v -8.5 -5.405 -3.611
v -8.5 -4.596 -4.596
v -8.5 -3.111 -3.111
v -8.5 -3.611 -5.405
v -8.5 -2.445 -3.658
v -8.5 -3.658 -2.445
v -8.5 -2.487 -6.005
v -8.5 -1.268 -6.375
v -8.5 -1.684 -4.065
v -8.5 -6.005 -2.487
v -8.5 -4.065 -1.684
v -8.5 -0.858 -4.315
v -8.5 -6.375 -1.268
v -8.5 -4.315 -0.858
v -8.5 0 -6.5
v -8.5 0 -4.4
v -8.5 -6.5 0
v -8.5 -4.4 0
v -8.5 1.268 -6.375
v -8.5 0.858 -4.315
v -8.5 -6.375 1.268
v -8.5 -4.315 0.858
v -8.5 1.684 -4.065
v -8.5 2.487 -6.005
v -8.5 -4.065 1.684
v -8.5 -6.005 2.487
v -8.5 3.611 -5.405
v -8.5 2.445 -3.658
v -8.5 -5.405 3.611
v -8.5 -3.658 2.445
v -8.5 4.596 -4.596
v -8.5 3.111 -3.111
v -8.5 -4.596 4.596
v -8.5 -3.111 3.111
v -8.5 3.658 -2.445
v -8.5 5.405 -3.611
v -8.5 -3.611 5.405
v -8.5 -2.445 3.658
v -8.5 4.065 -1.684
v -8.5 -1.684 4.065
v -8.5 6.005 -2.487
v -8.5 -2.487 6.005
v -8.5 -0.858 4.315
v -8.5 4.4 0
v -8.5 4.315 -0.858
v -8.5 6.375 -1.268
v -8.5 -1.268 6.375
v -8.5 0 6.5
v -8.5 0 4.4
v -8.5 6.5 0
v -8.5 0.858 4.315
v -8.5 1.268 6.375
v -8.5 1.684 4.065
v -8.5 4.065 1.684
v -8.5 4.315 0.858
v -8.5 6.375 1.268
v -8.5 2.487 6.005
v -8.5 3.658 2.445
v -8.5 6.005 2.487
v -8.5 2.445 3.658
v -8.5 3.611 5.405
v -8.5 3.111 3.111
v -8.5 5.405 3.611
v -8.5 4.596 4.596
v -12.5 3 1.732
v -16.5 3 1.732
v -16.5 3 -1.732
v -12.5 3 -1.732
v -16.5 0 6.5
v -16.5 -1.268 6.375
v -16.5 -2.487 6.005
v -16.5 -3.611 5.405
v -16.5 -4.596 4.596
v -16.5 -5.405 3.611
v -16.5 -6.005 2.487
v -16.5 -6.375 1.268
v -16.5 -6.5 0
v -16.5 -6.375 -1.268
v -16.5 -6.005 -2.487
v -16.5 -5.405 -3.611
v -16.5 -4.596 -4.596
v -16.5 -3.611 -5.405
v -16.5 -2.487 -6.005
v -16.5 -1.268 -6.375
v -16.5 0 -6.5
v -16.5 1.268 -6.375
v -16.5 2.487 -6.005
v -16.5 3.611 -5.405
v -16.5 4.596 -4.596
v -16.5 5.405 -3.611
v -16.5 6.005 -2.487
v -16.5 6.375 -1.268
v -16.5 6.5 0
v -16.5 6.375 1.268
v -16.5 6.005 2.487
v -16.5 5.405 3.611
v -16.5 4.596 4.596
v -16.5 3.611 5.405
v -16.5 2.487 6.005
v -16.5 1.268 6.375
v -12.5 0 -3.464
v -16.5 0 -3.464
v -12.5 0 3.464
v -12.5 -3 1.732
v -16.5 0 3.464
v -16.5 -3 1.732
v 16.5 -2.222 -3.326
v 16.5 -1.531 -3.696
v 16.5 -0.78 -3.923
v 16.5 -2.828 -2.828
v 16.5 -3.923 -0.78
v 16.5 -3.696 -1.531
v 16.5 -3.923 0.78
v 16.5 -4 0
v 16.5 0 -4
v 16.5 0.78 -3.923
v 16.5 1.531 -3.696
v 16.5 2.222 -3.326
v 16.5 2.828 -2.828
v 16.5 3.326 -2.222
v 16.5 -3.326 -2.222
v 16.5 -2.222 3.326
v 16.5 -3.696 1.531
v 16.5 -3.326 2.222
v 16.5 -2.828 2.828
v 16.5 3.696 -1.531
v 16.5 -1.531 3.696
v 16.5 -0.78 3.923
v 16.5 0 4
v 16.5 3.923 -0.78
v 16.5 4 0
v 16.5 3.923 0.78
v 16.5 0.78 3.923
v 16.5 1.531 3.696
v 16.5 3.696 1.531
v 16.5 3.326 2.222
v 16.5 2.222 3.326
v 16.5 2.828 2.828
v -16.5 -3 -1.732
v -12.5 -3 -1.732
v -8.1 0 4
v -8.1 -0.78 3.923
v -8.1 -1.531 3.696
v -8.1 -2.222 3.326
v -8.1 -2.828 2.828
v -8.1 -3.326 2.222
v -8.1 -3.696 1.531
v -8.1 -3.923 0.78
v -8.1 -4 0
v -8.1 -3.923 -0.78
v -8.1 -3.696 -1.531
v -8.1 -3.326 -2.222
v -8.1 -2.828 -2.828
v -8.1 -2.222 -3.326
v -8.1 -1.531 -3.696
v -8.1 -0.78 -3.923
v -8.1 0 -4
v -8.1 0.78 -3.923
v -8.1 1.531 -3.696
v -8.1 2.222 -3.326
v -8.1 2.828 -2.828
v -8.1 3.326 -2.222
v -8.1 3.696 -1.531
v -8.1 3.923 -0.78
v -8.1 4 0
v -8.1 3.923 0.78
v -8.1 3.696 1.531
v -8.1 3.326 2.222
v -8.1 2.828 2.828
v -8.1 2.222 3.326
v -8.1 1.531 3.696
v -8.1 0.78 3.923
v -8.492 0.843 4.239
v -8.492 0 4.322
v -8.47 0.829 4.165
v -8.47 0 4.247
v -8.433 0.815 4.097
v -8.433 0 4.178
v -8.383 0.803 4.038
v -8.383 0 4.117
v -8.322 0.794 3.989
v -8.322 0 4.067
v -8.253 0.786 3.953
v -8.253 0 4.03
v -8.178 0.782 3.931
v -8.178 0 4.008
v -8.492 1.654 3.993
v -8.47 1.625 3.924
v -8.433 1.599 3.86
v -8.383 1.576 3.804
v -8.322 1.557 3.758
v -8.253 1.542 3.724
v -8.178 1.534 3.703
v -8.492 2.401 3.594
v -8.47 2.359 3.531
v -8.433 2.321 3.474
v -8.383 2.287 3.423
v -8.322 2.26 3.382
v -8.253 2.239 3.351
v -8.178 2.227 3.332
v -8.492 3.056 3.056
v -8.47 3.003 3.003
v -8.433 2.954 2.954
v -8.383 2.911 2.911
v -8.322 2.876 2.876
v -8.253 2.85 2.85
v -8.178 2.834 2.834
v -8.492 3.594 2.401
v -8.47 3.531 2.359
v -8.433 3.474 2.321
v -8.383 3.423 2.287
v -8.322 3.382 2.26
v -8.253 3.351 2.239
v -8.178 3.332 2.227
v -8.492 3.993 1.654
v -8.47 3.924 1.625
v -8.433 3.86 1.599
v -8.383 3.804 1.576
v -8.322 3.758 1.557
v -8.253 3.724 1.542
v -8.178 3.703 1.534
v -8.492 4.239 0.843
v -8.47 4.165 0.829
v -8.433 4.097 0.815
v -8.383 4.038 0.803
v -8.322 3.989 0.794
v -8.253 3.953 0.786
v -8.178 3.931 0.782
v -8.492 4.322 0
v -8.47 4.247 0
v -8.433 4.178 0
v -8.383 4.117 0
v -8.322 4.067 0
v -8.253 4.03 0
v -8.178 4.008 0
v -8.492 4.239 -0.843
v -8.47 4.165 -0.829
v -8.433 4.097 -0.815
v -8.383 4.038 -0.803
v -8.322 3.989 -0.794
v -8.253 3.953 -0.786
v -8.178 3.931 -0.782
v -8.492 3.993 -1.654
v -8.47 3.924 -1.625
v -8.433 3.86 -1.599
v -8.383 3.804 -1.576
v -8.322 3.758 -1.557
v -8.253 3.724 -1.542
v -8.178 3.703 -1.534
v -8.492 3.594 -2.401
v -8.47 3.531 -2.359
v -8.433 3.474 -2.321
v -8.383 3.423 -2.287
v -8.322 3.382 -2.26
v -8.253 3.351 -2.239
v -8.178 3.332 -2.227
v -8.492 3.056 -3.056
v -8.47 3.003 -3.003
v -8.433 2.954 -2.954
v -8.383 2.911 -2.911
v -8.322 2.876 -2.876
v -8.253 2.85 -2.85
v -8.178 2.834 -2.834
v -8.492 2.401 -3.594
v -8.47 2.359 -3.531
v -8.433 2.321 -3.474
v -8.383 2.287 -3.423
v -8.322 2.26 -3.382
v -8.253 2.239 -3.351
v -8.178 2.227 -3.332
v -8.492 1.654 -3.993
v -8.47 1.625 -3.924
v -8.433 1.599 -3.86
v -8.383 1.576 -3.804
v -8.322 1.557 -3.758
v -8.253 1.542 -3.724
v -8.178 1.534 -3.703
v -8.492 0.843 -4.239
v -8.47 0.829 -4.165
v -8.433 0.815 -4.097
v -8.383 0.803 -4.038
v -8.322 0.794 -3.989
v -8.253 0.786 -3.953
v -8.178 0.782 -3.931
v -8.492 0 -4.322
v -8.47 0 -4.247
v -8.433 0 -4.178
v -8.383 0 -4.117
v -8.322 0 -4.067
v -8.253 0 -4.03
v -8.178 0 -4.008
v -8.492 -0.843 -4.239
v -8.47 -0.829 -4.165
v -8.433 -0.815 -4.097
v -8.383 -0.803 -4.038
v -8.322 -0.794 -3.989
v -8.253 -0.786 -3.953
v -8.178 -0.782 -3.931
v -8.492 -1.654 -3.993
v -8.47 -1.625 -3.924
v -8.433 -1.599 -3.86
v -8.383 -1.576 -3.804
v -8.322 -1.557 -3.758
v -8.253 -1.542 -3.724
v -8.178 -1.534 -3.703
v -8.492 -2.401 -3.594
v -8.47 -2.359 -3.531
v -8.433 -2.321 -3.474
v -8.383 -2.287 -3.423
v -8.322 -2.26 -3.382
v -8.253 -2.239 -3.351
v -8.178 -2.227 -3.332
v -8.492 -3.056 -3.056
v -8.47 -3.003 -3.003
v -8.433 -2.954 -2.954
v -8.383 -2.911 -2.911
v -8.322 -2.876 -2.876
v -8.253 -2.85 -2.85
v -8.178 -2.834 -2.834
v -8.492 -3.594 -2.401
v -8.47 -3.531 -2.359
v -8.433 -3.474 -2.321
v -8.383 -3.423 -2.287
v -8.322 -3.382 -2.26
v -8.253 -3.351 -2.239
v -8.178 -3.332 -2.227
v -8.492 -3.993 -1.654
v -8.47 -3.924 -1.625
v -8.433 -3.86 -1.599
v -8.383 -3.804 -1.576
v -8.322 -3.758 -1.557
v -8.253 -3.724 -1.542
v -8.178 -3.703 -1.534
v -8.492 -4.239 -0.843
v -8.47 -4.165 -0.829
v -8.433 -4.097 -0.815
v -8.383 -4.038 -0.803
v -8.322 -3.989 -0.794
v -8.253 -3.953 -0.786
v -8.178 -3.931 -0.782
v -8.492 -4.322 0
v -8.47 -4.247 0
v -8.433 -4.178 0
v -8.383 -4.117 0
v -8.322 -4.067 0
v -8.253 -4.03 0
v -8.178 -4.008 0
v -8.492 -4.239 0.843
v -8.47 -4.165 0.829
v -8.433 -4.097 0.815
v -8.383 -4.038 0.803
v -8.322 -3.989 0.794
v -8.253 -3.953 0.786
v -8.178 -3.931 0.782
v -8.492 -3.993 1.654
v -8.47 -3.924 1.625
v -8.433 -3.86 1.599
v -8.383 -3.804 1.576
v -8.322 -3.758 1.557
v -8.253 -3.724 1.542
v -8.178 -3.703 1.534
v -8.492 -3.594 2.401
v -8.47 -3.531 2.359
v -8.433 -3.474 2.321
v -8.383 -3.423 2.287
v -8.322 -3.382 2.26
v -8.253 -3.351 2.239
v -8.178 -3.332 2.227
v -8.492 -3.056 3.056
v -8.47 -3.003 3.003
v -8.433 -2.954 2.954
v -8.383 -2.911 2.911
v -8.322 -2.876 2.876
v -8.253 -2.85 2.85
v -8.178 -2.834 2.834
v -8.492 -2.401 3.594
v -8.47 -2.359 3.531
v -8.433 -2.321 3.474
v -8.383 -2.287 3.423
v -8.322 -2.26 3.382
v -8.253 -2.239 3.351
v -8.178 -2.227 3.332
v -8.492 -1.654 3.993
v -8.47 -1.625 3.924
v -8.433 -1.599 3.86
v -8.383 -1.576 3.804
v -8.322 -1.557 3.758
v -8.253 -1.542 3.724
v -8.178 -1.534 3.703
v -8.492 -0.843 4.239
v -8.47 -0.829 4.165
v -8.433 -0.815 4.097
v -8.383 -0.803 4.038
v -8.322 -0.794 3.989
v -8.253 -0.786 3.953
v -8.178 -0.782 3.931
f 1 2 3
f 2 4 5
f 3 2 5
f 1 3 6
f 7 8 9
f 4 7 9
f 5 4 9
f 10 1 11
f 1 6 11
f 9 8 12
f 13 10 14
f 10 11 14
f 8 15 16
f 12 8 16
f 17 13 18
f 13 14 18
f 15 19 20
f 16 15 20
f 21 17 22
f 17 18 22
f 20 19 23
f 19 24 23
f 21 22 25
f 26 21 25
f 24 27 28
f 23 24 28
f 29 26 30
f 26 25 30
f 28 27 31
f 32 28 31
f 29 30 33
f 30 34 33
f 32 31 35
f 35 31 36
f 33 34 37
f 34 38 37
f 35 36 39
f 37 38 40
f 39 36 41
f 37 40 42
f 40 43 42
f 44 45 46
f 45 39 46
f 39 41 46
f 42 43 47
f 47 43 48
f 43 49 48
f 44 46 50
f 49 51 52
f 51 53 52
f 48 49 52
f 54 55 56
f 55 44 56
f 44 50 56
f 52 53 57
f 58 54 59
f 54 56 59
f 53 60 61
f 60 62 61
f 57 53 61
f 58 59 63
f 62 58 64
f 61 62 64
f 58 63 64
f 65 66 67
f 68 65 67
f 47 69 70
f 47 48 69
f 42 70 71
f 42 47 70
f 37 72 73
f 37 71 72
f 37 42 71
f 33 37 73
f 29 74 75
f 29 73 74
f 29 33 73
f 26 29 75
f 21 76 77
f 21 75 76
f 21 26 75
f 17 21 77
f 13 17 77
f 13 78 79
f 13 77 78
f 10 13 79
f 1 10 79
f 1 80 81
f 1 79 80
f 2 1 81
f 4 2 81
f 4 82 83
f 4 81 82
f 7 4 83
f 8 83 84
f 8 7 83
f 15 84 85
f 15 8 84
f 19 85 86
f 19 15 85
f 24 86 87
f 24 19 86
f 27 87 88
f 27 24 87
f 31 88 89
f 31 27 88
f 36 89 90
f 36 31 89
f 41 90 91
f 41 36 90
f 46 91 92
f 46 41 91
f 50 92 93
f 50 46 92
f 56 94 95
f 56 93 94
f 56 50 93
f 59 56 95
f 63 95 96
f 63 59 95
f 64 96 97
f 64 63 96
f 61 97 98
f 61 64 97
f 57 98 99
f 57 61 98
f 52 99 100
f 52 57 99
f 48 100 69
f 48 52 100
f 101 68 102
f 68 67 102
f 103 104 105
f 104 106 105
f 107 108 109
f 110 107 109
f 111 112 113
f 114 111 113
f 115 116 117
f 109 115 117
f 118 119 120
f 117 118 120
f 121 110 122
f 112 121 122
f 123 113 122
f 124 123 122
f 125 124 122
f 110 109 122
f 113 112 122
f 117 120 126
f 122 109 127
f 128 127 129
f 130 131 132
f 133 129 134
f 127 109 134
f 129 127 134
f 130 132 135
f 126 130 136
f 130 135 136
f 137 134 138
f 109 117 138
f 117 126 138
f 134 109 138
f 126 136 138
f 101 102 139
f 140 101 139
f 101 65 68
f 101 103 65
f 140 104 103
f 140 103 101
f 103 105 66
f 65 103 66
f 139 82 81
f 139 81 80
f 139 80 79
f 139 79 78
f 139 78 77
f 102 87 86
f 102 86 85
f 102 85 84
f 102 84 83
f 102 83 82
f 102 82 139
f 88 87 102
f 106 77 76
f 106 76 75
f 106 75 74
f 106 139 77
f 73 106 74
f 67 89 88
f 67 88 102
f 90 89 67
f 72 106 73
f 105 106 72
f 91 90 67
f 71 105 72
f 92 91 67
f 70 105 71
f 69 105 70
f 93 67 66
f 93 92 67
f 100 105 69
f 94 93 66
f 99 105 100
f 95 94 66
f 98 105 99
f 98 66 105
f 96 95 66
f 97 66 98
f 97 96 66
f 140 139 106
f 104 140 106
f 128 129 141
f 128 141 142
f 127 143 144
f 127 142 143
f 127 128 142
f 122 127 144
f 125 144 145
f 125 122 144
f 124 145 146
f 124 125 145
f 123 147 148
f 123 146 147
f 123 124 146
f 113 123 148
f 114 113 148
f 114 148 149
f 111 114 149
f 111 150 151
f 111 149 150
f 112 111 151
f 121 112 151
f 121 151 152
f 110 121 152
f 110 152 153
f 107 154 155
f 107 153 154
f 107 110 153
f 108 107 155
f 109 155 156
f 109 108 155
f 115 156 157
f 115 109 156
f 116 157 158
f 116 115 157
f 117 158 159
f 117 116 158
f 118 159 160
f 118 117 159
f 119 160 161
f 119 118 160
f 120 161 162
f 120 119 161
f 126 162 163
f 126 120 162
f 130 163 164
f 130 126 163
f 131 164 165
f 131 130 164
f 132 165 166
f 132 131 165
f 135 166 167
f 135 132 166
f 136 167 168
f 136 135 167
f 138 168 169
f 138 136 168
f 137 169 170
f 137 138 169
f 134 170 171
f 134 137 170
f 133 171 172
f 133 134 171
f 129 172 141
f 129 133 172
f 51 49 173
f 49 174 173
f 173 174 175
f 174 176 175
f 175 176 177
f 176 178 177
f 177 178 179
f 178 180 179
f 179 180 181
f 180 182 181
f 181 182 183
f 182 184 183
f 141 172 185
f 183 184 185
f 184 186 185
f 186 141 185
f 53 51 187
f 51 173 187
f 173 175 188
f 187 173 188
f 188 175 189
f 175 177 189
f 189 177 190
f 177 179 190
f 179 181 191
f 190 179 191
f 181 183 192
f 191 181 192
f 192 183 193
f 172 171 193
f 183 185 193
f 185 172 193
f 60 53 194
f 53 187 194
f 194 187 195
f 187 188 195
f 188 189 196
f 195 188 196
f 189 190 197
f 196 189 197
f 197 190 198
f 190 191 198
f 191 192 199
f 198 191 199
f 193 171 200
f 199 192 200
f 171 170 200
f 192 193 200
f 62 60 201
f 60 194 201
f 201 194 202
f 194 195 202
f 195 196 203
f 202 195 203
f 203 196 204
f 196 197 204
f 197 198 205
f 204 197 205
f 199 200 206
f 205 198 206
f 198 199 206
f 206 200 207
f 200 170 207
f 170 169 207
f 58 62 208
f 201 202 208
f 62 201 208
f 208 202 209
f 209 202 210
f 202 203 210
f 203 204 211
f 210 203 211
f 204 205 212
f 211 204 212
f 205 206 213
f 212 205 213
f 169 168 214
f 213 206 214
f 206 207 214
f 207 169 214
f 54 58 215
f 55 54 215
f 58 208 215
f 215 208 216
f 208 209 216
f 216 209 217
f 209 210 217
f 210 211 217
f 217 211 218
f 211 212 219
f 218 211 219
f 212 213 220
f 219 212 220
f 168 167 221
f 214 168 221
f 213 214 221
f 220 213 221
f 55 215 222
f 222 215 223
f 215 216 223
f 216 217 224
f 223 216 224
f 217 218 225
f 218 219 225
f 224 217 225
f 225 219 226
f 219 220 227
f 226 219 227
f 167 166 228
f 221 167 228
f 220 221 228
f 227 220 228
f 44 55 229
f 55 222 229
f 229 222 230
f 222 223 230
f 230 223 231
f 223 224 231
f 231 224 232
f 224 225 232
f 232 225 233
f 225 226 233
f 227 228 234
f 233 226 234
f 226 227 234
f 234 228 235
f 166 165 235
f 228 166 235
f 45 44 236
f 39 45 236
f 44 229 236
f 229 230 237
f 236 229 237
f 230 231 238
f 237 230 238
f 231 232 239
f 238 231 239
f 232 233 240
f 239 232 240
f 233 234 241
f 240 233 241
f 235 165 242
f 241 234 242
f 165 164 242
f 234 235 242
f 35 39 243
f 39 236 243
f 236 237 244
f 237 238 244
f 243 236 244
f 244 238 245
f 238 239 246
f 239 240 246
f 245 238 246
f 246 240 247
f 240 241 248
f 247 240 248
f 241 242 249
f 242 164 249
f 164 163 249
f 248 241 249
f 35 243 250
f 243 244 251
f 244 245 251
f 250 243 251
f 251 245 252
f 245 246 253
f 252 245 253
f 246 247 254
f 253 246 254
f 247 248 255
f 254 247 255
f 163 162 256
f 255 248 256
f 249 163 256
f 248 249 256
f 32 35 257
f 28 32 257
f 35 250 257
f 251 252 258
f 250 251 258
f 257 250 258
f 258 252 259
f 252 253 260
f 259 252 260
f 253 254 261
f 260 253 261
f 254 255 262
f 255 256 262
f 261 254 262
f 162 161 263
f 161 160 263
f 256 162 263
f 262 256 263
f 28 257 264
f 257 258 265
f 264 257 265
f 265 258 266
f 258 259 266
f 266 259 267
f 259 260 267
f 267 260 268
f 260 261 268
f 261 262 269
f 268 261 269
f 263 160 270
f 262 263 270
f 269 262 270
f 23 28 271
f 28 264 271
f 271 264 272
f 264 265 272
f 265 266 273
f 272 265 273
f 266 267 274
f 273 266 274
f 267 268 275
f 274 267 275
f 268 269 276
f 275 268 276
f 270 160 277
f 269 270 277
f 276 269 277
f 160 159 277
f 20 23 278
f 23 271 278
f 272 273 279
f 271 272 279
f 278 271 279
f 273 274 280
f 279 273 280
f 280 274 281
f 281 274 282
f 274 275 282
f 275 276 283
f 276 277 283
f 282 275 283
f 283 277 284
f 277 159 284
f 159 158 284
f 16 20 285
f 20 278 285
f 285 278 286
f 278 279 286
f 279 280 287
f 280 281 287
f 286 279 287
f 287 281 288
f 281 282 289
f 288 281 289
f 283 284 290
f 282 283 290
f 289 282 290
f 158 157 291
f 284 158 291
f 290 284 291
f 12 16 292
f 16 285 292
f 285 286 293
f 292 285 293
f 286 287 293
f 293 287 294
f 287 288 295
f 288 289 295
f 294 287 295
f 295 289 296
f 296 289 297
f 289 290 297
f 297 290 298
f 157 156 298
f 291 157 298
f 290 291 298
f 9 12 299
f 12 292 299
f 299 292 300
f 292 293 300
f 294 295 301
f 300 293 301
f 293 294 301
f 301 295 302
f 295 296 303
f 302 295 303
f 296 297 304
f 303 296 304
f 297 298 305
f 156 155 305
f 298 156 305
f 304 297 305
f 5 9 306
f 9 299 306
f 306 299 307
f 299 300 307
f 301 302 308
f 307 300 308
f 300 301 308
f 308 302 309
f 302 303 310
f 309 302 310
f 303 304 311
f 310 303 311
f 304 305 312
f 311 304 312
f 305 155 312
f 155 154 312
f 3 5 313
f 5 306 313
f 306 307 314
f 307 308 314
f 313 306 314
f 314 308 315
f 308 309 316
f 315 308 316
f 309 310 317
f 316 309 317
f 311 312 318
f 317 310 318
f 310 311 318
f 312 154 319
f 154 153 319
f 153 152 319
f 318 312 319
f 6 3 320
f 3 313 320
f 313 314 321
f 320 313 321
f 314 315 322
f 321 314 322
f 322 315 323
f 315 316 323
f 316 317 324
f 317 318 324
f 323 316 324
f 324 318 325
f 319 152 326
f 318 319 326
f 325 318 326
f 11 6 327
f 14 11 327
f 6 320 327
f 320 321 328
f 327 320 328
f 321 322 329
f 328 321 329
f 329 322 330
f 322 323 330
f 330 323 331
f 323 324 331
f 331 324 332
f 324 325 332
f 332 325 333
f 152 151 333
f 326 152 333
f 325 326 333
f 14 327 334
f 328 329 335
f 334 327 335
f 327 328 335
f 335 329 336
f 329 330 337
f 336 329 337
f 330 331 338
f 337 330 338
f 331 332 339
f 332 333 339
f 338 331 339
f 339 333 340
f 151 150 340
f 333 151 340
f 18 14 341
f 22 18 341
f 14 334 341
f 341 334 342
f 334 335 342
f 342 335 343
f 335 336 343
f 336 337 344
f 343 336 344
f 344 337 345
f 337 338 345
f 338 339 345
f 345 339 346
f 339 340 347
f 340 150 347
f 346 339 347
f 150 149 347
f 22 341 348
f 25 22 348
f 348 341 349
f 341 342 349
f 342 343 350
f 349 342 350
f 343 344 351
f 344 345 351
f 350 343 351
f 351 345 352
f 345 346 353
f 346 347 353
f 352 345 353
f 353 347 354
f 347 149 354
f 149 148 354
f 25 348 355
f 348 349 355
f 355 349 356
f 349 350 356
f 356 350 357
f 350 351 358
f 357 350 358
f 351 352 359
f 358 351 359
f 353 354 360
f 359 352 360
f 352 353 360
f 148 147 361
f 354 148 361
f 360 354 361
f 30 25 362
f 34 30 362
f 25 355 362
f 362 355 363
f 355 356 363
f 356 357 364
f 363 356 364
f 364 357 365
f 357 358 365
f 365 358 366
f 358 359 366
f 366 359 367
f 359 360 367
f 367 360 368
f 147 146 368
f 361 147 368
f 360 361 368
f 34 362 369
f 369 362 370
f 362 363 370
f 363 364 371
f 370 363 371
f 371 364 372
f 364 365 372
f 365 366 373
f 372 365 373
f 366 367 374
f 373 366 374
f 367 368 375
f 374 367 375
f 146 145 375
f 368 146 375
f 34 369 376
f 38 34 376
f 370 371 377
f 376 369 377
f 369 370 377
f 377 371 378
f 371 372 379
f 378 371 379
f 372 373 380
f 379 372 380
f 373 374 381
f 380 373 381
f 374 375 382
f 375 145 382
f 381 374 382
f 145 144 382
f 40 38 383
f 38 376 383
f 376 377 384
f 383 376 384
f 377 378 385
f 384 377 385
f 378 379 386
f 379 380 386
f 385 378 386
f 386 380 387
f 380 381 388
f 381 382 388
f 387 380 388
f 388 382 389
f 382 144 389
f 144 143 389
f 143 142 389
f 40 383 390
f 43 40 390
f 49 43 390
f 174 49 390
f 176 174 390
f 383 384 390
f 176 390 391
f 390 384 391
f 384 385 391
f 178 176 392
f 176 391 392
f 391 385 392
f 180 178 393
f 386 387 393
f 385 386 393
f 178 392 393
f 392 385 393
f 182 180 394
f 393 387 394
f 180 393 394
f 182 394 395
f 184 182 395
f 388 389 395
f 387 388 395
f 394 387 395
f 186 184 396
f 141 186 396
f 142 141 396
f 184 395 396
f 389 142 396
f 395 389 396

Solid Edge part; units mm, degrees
sketch "Sketch1" plane through (10.8674, 0, 10.8674) normal (0, -1, 0) x (1, 0, 0)
  line L0 (-27.3674, -10.8674) -> (-27.3674, -4.3674)
  line L1 (-27.3674, -4.3674) -> (-19.3674, -4.3674)
  line L2 (-19.3674, -4.3674) -> (-19.3674, -6.4674)
  arc A0 (-19.3674, -6.4674) -> (-18.9674, -6.8674) centre (-18.9674, -6.4674) ccw
  line L3 (-18.9674, -6.8674) -> (5.6326, -6.8674)
  line L4 (5.6326, -6.8674) -> (5.6326, -10.8674)
  dimension "D1" = 8
  dimension "D2" = 25
  dimension "D3" = 0.4
revolve "RevolvedProtrusion1" add sketch "Sketch1" angle 360 about axis through (16.5, 0, 0) along (-1, 0, 0)
sketch "Sketch2" plane through (-16.5, 0, 0) normal (-1, 0, 0) x (0, 0, -1)
  line L0 (3.4641, 0) -> (1.7321, 3)
  line L1 (1.7321, 3) -> (-1.7321, 3)
  line L2 (-1.7321, 3) -> (-3.4641, 0)
  line L3 (-3.4641, 0) -> (-1.7321, -3)
  line L4 (-1.7321, -3) -> (1.7321, -3)
  line L5 (1.7321, -3) -> (3.4641, 0)
  dimension "D1" = 6
extrude "Cutout1" cut sketch "Sketch2" against normal blind 4
cosmetic_thread "Gänga" size "M8 x 0.75" thread depth 20
properties material "Steel"
